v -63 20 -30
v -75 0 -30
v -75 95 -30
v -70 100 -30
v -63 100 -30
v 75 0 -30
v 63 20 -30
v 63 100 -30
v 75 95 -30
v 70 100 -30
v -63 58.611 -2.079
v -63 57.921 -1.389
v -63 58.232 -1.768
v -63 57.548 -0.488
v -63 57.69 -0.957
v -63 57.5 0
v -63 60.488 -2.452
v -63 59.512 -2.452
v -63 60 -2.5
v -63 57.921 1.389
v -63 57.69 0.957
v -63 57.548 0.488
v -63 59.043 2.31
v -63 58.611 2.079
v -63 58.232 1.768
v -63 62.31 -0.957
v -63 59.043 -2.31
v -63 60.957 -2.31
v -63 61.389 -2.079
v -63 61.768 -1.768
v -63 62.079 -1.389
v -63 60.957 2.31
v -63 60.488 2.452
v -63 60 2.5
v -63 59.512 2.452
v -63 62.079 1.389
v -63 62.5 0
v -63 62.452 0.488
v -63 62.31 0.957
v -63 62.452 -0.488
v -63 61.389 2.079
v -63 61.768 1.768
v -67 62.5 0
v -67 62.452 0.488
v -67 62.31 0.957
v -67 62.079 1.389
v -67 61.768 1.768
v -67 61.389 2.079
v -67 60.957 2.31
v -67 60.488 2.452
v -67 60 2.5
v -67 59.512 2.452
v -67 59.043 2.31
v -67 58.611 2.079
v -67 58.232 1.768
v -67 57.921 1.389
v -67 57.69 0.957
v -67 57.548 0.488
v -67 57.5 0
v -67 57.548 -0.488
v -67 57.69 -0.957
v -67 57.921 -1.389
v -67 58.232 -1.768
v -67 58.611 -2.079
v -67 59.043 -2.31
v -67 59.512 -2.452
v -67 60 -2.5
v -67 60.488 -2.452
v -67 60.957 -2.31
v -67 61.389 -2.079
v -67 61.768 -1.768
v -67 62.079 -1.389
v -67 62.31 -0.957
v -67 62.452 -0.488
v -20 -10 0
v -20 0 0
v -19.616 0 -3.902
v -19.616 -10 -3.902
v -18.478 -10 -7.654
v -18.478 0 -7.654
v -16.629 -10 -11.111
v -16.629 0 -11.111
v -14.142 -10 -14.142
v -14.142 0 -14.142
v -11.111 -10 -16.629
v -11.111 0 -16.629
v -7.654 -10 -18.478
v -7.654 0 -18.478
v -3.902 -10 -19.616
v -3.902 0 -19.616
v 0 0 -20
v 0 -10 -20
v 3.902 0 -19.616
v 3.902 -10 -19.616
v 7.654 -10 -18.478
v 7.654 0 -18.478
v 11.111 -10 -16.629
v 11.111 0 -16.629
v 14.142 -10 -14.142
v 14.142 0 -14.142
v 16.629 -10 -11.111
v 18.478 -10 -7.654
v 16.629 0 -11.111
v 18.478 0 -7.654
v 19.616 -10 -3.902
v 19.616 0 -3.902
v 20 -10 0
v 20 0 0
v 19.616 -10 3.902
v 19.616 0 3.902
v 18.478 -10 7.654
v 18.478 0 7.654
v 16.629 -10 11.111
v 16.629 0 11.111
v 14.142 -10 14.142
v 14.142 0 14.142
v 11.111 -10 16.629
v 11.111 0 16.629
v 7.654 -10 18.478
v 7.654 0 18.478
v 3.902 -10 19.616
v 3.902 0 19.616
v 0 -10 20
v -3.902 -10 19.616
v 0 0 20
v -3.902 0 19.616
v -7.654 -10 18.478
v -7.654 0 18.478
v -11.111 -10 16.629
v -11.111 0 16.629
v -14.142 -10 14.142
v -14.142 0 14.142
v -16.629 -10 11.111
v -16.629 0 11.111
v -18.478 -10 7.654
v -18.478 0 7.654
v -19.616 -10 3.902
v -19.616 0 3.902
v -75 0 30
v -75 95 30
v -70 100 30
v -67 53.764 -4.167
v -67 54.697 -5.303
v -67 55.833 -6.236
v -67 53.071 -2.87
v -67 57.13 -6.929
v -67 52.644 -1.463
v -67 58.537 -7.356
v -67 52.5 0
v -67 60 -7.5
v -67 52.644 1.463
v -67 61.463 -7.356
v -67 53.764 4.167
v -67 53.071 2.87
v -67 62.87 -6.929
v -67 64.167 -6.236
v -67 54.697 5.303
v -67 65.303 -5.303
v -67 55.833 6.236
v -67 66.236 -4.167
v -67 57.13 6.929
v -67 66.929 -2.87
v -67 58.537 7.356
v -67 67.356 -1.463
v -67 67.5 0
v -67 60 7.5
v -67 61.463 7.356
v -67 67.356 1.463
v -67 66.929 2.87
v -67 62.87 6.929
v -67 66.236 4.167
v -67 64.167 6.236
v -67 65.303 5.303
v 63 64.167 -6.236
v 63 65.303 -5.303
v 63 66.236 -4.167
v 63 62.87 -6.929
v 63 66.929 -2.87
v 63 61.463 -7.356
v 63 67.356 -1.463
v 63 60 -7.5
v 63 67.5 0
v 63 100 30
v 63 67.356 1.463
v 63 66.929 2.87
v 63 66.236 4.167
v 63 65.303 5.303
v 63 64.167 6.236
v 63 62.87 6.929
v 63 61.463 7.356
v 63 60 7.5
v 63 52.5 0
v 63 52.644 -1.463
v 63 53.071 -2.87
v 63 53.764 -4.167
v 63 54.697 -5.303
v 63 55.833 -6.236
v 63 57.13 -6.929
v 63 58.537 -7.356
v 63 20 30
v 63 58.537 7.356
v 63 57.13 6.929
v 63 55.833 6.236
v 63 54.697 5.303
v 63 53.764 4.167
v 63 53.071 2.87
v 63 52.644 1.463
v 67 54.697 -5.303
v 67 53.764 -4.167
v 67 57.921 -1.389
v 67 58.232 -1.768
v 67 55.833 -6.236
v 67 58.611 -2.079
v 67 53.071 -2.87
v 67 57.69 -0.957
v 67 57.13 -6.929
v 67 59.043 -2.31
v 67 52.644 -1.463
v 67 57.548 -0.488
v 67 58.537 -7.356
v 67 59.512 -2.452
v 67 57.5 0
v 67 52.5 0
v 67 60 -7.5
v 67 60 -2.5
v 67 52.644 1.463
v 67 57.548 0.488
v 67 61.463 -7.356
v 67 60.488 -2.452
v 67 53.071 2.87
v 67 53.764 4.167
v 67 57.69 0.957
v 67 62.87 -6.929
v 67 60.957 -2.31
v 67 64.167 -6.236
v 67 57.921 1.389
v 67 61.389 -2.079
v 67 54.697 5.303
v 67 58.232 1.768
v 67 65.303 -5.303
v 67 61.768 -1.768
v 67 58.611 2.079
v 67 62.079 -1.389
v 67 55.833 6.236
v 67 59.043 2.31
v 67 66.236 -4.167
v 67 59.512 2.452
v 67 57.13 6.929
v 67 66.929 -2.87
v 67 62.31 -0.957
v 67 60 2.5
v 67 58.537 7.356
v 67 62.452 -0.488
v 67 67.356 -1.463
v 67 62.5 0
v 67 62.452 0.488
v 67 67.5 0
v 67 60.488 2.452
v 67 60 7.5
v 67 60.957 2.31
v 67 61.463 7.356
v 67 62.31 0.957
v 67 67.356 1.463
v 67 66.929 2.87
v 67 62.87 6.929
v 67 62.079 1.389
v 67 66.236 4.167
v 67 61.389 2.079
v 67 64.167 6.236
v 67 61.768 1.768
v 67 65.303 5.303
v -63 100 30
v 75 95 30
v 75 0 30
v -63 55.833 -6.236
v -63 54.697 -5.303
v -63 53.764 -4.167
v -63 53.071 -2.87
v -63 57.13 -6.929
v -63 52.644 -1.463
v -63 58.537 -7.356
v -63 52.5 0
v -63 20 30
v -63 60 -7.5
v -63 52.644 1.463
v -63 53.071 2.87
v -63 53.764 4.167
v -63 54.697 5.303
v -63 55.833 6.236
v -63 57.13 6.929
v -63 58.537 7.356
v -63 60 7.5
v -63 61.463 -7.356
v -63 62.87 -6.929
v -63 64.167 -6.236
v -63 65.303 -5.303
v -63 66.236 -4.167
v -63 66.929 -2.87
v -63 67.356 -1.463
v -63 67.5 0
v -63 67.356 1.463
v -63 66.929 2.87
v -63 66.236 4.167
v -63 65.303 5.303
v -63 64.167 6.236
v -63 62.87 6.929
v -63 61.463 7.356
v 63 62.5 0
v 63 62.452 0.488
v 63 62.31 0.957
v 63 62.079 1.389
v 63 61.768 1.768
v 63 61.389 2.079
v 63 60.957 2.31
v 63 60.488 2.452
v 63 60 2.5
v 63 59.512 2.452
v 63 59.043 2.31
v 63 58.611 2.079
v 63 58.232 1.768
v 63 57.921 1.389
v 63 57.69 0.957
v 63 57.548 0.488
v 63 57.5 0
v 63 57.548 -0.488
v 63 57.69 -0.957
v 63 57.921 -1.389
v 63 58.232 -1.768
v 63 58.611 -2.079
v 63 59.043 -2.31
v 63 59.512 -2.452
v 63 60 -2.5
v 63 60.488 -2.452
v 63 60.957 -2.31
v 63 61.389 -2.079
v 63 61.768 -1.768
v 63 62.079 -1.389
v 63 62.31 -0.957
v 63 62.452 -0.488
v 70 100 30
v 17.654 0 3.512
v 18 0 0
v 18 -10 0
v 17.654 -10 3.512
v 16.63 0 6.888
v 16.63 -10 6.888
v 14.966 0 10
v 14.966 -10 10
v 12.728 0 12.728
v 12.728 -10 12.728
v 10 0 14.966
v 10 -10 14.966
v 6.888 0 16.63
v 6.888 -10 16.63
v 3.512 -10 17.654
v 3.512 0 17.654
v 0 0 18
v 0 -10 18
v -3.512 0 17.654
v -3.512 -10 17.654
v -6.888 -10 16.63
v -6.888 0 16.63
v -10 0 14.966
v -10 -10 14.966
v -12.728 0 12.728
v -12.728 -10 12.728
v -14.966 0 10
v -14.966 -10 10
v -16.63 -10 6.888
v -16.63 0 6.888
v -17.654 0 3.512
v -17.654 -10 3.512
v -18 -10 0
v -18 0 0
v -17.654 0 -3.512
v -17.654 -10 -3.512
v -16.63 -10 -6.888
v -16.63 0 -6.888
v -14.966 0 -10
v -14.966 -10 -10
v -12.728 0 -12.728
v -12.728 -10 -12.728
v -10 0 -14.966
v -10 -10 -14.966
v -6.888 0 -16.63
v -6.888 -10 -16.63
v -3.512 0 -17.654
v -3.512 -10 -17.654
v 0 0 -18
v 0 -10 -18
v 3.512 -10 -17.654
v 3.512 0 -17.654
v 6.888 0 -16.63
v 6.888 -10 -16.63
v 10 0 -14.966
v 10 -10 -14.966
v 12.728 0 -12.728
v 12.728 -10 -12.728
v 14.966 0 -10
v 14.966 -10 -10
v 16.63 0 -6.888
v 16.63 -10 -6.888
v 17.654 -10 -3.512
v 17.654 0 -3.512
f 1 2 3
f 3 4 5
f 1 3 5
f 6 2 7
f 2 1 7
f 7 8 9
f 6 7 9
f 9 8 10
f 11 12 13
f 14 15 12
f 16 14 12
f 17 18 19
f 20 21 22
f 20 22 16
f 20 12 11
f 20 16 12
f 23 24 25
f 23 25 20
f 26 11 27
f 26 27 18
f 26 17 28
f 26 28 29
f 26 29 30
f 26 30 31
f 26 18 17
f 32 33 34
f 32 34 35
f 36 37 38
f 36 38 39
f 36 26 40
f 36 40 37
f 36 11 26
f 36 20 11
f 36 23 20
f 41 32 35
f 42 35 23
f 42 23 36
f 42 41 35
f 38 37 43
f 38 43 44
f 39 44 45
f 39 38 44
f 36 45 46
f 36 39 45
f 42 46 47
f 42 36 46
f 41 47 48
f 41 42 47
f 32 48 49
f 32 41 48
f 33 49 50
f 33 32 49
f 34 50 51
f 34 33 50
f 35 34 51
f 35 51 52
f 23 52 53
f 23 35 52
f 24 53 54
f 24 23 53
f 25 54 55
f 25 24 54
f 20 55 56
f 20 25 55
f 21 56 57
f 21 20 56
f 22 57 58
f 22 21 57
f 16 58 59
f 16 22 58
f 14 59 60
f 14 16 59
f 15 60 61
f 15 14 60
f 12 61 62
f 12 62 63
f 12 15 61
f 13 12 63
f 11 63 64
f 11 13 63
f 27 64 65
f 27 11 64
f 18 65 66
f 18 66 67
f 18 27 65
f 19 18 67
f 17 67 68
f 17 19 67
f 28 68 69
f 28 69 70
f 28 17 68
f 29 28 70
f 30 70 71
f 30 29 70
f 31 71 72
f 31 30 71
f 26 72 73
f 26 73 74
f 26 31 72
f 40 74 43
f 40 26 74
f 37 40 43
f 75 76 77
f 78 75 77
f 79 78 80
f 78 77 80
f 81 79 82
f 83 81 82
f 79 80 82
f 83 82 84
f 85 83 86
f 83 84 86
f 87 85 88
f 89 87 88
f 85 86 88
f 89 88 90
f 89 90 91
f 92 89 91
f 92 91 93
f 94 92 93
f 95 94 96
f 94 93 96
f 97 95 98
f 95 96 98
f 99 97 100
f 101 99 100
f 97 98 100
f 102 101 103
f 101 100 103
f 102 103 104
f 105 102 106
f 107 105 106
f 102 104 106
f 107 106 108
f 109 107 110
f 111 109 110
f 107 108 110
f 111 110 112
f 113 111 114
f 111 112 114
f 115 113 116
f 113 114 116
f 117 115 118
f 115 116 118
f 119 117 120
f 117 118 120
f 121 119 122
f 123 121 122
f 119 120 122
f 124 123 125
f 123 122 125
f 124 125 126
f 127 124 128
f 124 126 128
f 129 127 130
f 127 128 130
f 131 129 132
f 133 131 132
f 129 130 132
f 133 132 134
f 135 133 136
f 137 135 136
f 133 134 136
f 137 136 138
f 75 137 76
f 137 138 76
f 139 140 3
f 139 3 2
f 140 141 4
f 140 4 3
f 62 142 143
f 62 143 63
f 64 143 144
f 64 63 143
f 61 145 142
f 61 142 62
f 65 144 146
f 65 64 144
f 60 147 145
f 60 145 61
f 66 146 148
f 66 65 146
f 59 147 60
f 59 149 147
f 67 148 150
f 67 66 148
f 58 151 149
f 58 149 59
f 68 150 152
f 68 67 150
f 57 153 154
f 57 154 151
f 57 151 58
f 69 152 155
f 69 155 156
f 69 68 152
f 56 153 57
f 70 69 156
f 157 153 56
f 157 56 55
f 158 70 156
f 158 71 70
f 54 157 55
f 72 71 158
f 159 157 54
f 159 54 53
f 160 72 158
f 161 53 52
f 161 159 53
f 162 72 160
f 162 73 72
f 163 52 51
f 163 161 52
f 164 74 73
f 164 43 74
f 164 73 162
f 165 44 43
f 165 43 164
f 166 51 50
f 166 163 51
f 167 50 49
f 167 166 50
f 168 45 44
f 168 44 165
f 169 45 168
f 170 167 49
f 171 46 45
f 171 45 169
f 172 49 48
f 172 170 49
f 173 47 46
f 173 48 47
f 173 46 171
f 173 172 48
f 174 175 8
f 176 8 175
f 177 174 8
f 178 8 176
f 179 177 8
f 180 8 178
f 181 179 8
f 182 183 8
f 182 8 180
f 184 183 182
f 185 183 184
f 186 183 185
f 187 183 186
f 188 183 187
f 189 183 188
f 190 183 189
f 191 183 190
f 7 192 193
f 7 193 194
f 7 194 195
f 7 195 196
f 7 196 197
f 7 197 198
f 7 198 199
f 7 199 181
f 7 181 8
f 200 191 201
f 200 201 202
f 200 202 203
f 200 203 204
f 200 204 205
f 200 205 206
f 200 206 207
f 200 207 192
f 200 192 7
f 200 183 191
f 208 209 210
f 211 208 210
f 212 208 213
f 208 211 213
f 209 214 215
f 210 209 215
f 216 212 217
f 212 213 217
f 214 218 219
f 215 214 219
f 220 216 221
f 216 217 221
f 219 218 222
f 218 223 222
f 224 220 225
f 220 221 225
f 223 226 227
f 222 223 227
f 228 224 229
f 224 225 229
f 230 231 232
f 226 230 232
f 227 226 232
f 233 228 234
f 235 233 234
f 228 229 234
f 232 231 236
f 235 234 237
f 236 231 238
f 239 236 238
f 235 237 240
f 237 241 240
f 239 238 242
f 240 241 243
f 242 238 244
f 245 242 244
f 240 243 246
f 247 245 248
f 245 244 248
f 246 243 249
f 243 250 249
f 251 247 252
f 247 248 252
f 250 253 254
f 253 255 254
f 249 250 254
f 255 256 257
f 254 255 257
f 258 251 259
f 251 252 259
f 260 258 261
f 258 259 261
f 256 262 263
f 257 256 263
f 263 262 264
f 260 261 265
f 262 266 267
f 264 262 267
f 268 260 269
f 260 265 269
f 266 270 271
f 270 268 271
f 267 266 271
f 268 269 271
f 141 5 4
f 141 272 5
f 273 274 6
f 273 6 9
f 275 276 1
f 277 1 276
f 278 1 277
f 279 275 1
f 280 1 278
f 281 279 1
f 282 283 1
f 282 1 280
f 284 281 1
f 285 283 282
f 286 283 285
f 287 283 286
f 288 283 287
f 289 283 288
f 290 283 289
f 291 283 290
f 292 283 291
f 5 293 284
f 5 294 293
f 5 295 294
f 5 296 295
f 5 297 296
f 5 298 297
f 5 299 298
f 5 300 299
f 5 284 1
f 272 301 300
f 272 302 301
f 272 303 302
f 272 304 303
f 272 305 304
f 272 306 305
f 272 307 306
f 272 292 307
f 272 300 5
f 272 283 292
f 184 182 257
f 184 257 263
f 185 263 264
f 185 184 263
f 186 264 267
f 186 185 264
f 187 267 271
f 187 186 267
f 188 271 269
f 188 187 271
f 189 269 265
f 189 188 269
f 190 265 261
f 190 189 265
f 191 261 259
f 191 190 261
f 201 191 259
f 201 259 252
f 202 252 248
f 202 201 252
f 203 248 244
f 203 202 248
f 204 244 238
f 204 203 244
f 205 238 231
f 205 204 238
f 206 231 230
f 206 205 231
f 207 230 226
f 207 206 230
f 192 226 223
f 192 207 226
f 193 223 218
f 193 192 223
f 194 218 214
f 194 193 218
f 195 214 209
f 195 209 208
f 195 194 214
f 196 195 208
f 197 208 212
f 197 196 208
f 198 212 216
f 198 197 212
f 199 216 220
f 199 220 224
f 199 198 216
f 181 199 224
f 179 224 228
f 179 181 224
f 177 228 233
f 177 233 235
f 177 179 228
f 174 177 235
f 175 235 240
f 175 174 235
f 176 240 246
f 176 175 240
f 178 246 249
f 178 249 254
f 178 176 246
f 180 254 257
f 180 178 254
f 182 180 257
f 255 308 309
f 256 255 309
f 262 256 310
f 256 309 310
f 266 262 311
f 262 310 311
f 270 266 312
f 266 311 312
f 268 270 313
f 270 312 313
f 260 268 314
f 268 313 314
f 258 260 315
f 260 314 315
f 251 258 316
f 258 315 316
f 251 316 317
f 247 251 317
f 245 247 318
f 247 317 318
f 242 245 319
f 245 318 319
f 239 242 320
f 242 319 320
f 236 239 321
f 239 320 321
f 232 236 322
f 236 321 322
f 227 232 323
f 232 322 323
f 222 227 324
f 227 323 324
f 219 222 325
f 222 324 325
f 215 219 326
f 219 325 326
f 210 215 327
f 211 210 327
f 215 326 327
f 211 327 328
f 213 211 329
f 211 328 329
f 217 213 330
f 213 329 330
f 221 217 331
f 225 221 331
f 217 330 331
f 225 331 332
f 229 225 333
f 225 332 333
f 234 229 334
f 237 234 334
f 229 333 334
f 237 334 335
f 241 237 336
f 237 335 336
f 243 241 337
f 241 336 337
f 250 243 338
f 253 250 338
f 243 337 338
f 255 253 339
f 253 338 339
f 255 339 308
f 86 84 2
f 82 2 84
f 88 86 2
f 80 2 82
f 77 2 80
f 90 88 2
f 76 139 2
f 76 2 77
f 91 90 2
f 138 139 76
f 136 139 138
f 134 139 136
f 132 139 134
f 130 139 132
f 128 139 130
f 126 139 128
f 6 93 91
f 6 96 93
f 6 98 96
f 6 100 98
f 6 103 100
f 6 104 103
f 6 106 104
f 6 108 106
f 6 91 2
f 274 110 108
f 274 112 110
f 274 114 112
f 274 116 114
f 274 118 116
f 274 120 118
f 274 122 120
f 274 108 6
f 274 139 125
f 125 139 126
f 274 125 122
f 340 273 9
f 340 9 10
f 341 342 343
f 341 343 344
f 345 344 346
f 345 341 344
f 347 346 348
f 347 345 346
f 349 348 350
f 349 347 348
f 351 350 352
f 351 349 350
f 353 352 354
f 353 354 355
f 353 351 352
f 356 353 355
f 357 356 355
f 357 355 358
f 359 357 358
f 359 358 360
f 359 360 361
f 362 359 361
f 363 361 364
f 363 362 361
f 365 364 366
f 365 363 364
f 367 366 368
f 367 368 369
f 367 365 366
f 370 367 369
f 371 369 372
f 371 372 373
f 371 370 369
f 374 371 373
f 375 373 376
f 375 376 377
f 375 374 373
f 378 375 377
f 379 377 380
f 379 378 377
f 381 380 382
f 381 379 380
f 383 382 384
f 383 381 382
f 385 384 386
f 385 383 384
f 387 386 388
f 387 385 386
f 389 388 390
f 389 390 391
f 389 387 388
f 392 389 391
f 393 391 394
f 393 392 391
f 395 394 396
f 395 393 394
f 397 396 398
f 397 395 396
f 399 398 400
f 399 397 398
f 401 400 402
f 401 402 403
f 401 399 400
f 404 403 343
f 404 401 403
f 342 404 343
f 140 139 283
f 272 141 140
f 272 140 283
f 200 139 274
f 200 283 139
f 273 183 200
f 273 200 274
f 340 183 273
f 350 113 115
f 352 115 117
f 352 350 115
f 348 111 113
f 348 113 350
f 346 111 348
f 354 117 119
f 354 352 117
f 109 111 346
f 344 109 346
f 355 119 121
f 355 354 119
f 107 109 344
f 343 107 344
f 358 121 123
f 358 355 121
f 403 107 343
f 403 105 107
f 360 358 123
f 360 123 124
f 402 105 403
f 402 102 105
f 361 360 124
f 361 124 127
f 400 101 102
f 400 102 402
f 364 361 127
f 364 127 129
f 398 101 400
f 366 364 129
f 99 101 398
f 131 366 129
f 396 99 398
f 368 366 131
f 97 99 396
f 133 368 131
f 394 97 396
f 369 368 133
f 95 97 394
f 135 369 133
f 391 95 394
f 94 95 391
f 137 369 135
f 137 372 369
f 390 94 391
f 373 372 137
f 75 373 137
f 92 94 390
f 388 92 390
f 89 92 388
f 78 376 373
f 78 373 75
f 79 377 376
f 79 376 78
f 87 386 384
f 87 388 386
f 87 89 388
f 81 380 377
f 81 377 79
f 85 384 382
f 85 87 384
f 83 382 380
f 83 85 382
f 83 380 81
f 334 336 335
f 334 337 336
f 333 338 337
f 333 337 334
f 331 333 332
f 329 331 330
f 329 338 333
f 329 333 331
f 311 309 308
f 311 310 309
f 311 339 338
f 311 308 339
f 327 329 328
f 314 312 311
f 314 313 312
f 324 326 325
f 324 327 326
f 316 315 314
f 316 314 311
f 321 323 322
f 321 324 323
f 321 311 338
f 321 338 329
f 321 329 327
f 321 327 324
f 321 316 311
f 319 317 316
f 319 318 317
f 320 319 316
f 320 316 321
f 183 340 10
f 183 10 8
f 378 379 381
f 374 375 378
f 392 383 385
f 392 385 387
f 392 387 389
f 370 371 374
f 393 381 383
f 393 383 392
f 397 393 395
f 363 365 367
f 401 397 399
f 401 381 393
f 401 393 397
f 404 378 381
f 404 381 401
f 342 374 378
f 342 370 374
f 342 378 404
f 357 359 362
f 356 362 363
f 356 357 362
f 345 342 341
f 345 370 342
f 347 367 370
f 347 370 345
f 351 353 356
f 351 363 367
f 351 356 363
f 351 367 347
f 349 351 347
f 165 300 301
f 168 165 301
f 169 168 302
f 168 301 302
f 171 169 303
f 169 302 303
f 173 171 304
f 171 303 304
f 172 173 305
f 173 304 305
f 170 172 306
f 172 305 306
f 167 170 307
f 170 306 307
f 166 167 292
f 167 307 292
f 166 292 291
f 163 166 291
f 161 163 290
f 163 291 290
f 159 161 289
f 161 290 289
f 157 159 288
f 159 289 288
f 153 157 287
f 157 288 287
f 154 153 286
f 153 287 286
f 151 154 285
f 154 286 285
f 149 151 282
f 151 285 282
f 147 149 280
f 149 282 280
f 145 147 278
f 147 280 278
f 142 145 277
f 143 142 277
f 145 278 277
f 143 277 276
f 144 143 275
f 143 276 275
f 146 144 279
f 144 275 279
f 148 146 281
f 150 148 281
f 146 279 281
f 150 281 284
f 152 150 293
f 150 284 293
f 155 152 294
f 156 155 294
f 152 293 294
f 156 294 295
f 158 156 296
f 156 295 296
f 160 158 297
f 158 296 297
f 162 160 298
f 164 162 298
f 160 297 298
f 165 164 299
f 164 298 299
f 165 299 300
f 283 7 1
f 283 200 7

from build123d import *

# Parameters (mm, degrees)
EXTRUDE_1_DEPTH     = 30
SKETCH_2_R          = 20
SKETCH_2_R_2        = 18
EXTRUDE_2_DEPTH     = 10
SKETCH_3_R          = 7.5
SKETCH_3_R_2        = 2.5
CUT_EXTRUDE_1_DEPTH = 4


with BuildPart() as part:
    # 草图1 → 凸台-拉伸1 (new, symmetric)
    with BuildSketch(Plane.XY):
        Polygon((-63, 100), (-70, 100), (-75, 95), (-75, 0), (0, 0), (0, 20), (-63, 20), align=None)
        Polygon((63, 20), (0, 20), (0, 0), (75, 0), (75, 95), (70, 100), (63, 100), align=None)
    extrude(amount=EXTRUDE_1_DEPTH, both=True)

    # 草图2 → 凸台-拉伸2 (add)
    with BuildSketch(Plane.XZ):
        with Locations(Location((0, 0, 0), (0, 0, 180))):
            Circle(SKETCH_2_R)
        Circle(SKETCH_2_R_2, mode=Mode.SUBTRACT)
    extrude(amount=EXTRUDE_2_DEPTH)

    # 草图3 → 切除-拉伸1 (cut)
    with BuildSketch(Plane(origin=(-63, 0, 0), x_dir=(0, 0, -1), z_dir=(1, 0, 0))):
        with Locations(Location((0, 60, 0), (0, 0, 90))):
            Circle(SKETCH_3_R)
        with Locations(Location((0, 60, 0), (0, 0, 90))):
            Circle(SKETCH_3_R_2, mode=Mode.SUBTRACT)
    cut_extrude_1 = extrude(amount=-CUT_EXTRUDE_1_DEPTH, mode=Mode.SUBTRACT)

    # 镜向1: 切除-拉伸1 across plane
    add(cut_extrude_1.mirror(Plane(origin=(0, 0, 0), x_dir=(0, 0, 1), z_dir=(1, 0, 0))), mode=Mode.SUBTRACT)


solid = part.part
